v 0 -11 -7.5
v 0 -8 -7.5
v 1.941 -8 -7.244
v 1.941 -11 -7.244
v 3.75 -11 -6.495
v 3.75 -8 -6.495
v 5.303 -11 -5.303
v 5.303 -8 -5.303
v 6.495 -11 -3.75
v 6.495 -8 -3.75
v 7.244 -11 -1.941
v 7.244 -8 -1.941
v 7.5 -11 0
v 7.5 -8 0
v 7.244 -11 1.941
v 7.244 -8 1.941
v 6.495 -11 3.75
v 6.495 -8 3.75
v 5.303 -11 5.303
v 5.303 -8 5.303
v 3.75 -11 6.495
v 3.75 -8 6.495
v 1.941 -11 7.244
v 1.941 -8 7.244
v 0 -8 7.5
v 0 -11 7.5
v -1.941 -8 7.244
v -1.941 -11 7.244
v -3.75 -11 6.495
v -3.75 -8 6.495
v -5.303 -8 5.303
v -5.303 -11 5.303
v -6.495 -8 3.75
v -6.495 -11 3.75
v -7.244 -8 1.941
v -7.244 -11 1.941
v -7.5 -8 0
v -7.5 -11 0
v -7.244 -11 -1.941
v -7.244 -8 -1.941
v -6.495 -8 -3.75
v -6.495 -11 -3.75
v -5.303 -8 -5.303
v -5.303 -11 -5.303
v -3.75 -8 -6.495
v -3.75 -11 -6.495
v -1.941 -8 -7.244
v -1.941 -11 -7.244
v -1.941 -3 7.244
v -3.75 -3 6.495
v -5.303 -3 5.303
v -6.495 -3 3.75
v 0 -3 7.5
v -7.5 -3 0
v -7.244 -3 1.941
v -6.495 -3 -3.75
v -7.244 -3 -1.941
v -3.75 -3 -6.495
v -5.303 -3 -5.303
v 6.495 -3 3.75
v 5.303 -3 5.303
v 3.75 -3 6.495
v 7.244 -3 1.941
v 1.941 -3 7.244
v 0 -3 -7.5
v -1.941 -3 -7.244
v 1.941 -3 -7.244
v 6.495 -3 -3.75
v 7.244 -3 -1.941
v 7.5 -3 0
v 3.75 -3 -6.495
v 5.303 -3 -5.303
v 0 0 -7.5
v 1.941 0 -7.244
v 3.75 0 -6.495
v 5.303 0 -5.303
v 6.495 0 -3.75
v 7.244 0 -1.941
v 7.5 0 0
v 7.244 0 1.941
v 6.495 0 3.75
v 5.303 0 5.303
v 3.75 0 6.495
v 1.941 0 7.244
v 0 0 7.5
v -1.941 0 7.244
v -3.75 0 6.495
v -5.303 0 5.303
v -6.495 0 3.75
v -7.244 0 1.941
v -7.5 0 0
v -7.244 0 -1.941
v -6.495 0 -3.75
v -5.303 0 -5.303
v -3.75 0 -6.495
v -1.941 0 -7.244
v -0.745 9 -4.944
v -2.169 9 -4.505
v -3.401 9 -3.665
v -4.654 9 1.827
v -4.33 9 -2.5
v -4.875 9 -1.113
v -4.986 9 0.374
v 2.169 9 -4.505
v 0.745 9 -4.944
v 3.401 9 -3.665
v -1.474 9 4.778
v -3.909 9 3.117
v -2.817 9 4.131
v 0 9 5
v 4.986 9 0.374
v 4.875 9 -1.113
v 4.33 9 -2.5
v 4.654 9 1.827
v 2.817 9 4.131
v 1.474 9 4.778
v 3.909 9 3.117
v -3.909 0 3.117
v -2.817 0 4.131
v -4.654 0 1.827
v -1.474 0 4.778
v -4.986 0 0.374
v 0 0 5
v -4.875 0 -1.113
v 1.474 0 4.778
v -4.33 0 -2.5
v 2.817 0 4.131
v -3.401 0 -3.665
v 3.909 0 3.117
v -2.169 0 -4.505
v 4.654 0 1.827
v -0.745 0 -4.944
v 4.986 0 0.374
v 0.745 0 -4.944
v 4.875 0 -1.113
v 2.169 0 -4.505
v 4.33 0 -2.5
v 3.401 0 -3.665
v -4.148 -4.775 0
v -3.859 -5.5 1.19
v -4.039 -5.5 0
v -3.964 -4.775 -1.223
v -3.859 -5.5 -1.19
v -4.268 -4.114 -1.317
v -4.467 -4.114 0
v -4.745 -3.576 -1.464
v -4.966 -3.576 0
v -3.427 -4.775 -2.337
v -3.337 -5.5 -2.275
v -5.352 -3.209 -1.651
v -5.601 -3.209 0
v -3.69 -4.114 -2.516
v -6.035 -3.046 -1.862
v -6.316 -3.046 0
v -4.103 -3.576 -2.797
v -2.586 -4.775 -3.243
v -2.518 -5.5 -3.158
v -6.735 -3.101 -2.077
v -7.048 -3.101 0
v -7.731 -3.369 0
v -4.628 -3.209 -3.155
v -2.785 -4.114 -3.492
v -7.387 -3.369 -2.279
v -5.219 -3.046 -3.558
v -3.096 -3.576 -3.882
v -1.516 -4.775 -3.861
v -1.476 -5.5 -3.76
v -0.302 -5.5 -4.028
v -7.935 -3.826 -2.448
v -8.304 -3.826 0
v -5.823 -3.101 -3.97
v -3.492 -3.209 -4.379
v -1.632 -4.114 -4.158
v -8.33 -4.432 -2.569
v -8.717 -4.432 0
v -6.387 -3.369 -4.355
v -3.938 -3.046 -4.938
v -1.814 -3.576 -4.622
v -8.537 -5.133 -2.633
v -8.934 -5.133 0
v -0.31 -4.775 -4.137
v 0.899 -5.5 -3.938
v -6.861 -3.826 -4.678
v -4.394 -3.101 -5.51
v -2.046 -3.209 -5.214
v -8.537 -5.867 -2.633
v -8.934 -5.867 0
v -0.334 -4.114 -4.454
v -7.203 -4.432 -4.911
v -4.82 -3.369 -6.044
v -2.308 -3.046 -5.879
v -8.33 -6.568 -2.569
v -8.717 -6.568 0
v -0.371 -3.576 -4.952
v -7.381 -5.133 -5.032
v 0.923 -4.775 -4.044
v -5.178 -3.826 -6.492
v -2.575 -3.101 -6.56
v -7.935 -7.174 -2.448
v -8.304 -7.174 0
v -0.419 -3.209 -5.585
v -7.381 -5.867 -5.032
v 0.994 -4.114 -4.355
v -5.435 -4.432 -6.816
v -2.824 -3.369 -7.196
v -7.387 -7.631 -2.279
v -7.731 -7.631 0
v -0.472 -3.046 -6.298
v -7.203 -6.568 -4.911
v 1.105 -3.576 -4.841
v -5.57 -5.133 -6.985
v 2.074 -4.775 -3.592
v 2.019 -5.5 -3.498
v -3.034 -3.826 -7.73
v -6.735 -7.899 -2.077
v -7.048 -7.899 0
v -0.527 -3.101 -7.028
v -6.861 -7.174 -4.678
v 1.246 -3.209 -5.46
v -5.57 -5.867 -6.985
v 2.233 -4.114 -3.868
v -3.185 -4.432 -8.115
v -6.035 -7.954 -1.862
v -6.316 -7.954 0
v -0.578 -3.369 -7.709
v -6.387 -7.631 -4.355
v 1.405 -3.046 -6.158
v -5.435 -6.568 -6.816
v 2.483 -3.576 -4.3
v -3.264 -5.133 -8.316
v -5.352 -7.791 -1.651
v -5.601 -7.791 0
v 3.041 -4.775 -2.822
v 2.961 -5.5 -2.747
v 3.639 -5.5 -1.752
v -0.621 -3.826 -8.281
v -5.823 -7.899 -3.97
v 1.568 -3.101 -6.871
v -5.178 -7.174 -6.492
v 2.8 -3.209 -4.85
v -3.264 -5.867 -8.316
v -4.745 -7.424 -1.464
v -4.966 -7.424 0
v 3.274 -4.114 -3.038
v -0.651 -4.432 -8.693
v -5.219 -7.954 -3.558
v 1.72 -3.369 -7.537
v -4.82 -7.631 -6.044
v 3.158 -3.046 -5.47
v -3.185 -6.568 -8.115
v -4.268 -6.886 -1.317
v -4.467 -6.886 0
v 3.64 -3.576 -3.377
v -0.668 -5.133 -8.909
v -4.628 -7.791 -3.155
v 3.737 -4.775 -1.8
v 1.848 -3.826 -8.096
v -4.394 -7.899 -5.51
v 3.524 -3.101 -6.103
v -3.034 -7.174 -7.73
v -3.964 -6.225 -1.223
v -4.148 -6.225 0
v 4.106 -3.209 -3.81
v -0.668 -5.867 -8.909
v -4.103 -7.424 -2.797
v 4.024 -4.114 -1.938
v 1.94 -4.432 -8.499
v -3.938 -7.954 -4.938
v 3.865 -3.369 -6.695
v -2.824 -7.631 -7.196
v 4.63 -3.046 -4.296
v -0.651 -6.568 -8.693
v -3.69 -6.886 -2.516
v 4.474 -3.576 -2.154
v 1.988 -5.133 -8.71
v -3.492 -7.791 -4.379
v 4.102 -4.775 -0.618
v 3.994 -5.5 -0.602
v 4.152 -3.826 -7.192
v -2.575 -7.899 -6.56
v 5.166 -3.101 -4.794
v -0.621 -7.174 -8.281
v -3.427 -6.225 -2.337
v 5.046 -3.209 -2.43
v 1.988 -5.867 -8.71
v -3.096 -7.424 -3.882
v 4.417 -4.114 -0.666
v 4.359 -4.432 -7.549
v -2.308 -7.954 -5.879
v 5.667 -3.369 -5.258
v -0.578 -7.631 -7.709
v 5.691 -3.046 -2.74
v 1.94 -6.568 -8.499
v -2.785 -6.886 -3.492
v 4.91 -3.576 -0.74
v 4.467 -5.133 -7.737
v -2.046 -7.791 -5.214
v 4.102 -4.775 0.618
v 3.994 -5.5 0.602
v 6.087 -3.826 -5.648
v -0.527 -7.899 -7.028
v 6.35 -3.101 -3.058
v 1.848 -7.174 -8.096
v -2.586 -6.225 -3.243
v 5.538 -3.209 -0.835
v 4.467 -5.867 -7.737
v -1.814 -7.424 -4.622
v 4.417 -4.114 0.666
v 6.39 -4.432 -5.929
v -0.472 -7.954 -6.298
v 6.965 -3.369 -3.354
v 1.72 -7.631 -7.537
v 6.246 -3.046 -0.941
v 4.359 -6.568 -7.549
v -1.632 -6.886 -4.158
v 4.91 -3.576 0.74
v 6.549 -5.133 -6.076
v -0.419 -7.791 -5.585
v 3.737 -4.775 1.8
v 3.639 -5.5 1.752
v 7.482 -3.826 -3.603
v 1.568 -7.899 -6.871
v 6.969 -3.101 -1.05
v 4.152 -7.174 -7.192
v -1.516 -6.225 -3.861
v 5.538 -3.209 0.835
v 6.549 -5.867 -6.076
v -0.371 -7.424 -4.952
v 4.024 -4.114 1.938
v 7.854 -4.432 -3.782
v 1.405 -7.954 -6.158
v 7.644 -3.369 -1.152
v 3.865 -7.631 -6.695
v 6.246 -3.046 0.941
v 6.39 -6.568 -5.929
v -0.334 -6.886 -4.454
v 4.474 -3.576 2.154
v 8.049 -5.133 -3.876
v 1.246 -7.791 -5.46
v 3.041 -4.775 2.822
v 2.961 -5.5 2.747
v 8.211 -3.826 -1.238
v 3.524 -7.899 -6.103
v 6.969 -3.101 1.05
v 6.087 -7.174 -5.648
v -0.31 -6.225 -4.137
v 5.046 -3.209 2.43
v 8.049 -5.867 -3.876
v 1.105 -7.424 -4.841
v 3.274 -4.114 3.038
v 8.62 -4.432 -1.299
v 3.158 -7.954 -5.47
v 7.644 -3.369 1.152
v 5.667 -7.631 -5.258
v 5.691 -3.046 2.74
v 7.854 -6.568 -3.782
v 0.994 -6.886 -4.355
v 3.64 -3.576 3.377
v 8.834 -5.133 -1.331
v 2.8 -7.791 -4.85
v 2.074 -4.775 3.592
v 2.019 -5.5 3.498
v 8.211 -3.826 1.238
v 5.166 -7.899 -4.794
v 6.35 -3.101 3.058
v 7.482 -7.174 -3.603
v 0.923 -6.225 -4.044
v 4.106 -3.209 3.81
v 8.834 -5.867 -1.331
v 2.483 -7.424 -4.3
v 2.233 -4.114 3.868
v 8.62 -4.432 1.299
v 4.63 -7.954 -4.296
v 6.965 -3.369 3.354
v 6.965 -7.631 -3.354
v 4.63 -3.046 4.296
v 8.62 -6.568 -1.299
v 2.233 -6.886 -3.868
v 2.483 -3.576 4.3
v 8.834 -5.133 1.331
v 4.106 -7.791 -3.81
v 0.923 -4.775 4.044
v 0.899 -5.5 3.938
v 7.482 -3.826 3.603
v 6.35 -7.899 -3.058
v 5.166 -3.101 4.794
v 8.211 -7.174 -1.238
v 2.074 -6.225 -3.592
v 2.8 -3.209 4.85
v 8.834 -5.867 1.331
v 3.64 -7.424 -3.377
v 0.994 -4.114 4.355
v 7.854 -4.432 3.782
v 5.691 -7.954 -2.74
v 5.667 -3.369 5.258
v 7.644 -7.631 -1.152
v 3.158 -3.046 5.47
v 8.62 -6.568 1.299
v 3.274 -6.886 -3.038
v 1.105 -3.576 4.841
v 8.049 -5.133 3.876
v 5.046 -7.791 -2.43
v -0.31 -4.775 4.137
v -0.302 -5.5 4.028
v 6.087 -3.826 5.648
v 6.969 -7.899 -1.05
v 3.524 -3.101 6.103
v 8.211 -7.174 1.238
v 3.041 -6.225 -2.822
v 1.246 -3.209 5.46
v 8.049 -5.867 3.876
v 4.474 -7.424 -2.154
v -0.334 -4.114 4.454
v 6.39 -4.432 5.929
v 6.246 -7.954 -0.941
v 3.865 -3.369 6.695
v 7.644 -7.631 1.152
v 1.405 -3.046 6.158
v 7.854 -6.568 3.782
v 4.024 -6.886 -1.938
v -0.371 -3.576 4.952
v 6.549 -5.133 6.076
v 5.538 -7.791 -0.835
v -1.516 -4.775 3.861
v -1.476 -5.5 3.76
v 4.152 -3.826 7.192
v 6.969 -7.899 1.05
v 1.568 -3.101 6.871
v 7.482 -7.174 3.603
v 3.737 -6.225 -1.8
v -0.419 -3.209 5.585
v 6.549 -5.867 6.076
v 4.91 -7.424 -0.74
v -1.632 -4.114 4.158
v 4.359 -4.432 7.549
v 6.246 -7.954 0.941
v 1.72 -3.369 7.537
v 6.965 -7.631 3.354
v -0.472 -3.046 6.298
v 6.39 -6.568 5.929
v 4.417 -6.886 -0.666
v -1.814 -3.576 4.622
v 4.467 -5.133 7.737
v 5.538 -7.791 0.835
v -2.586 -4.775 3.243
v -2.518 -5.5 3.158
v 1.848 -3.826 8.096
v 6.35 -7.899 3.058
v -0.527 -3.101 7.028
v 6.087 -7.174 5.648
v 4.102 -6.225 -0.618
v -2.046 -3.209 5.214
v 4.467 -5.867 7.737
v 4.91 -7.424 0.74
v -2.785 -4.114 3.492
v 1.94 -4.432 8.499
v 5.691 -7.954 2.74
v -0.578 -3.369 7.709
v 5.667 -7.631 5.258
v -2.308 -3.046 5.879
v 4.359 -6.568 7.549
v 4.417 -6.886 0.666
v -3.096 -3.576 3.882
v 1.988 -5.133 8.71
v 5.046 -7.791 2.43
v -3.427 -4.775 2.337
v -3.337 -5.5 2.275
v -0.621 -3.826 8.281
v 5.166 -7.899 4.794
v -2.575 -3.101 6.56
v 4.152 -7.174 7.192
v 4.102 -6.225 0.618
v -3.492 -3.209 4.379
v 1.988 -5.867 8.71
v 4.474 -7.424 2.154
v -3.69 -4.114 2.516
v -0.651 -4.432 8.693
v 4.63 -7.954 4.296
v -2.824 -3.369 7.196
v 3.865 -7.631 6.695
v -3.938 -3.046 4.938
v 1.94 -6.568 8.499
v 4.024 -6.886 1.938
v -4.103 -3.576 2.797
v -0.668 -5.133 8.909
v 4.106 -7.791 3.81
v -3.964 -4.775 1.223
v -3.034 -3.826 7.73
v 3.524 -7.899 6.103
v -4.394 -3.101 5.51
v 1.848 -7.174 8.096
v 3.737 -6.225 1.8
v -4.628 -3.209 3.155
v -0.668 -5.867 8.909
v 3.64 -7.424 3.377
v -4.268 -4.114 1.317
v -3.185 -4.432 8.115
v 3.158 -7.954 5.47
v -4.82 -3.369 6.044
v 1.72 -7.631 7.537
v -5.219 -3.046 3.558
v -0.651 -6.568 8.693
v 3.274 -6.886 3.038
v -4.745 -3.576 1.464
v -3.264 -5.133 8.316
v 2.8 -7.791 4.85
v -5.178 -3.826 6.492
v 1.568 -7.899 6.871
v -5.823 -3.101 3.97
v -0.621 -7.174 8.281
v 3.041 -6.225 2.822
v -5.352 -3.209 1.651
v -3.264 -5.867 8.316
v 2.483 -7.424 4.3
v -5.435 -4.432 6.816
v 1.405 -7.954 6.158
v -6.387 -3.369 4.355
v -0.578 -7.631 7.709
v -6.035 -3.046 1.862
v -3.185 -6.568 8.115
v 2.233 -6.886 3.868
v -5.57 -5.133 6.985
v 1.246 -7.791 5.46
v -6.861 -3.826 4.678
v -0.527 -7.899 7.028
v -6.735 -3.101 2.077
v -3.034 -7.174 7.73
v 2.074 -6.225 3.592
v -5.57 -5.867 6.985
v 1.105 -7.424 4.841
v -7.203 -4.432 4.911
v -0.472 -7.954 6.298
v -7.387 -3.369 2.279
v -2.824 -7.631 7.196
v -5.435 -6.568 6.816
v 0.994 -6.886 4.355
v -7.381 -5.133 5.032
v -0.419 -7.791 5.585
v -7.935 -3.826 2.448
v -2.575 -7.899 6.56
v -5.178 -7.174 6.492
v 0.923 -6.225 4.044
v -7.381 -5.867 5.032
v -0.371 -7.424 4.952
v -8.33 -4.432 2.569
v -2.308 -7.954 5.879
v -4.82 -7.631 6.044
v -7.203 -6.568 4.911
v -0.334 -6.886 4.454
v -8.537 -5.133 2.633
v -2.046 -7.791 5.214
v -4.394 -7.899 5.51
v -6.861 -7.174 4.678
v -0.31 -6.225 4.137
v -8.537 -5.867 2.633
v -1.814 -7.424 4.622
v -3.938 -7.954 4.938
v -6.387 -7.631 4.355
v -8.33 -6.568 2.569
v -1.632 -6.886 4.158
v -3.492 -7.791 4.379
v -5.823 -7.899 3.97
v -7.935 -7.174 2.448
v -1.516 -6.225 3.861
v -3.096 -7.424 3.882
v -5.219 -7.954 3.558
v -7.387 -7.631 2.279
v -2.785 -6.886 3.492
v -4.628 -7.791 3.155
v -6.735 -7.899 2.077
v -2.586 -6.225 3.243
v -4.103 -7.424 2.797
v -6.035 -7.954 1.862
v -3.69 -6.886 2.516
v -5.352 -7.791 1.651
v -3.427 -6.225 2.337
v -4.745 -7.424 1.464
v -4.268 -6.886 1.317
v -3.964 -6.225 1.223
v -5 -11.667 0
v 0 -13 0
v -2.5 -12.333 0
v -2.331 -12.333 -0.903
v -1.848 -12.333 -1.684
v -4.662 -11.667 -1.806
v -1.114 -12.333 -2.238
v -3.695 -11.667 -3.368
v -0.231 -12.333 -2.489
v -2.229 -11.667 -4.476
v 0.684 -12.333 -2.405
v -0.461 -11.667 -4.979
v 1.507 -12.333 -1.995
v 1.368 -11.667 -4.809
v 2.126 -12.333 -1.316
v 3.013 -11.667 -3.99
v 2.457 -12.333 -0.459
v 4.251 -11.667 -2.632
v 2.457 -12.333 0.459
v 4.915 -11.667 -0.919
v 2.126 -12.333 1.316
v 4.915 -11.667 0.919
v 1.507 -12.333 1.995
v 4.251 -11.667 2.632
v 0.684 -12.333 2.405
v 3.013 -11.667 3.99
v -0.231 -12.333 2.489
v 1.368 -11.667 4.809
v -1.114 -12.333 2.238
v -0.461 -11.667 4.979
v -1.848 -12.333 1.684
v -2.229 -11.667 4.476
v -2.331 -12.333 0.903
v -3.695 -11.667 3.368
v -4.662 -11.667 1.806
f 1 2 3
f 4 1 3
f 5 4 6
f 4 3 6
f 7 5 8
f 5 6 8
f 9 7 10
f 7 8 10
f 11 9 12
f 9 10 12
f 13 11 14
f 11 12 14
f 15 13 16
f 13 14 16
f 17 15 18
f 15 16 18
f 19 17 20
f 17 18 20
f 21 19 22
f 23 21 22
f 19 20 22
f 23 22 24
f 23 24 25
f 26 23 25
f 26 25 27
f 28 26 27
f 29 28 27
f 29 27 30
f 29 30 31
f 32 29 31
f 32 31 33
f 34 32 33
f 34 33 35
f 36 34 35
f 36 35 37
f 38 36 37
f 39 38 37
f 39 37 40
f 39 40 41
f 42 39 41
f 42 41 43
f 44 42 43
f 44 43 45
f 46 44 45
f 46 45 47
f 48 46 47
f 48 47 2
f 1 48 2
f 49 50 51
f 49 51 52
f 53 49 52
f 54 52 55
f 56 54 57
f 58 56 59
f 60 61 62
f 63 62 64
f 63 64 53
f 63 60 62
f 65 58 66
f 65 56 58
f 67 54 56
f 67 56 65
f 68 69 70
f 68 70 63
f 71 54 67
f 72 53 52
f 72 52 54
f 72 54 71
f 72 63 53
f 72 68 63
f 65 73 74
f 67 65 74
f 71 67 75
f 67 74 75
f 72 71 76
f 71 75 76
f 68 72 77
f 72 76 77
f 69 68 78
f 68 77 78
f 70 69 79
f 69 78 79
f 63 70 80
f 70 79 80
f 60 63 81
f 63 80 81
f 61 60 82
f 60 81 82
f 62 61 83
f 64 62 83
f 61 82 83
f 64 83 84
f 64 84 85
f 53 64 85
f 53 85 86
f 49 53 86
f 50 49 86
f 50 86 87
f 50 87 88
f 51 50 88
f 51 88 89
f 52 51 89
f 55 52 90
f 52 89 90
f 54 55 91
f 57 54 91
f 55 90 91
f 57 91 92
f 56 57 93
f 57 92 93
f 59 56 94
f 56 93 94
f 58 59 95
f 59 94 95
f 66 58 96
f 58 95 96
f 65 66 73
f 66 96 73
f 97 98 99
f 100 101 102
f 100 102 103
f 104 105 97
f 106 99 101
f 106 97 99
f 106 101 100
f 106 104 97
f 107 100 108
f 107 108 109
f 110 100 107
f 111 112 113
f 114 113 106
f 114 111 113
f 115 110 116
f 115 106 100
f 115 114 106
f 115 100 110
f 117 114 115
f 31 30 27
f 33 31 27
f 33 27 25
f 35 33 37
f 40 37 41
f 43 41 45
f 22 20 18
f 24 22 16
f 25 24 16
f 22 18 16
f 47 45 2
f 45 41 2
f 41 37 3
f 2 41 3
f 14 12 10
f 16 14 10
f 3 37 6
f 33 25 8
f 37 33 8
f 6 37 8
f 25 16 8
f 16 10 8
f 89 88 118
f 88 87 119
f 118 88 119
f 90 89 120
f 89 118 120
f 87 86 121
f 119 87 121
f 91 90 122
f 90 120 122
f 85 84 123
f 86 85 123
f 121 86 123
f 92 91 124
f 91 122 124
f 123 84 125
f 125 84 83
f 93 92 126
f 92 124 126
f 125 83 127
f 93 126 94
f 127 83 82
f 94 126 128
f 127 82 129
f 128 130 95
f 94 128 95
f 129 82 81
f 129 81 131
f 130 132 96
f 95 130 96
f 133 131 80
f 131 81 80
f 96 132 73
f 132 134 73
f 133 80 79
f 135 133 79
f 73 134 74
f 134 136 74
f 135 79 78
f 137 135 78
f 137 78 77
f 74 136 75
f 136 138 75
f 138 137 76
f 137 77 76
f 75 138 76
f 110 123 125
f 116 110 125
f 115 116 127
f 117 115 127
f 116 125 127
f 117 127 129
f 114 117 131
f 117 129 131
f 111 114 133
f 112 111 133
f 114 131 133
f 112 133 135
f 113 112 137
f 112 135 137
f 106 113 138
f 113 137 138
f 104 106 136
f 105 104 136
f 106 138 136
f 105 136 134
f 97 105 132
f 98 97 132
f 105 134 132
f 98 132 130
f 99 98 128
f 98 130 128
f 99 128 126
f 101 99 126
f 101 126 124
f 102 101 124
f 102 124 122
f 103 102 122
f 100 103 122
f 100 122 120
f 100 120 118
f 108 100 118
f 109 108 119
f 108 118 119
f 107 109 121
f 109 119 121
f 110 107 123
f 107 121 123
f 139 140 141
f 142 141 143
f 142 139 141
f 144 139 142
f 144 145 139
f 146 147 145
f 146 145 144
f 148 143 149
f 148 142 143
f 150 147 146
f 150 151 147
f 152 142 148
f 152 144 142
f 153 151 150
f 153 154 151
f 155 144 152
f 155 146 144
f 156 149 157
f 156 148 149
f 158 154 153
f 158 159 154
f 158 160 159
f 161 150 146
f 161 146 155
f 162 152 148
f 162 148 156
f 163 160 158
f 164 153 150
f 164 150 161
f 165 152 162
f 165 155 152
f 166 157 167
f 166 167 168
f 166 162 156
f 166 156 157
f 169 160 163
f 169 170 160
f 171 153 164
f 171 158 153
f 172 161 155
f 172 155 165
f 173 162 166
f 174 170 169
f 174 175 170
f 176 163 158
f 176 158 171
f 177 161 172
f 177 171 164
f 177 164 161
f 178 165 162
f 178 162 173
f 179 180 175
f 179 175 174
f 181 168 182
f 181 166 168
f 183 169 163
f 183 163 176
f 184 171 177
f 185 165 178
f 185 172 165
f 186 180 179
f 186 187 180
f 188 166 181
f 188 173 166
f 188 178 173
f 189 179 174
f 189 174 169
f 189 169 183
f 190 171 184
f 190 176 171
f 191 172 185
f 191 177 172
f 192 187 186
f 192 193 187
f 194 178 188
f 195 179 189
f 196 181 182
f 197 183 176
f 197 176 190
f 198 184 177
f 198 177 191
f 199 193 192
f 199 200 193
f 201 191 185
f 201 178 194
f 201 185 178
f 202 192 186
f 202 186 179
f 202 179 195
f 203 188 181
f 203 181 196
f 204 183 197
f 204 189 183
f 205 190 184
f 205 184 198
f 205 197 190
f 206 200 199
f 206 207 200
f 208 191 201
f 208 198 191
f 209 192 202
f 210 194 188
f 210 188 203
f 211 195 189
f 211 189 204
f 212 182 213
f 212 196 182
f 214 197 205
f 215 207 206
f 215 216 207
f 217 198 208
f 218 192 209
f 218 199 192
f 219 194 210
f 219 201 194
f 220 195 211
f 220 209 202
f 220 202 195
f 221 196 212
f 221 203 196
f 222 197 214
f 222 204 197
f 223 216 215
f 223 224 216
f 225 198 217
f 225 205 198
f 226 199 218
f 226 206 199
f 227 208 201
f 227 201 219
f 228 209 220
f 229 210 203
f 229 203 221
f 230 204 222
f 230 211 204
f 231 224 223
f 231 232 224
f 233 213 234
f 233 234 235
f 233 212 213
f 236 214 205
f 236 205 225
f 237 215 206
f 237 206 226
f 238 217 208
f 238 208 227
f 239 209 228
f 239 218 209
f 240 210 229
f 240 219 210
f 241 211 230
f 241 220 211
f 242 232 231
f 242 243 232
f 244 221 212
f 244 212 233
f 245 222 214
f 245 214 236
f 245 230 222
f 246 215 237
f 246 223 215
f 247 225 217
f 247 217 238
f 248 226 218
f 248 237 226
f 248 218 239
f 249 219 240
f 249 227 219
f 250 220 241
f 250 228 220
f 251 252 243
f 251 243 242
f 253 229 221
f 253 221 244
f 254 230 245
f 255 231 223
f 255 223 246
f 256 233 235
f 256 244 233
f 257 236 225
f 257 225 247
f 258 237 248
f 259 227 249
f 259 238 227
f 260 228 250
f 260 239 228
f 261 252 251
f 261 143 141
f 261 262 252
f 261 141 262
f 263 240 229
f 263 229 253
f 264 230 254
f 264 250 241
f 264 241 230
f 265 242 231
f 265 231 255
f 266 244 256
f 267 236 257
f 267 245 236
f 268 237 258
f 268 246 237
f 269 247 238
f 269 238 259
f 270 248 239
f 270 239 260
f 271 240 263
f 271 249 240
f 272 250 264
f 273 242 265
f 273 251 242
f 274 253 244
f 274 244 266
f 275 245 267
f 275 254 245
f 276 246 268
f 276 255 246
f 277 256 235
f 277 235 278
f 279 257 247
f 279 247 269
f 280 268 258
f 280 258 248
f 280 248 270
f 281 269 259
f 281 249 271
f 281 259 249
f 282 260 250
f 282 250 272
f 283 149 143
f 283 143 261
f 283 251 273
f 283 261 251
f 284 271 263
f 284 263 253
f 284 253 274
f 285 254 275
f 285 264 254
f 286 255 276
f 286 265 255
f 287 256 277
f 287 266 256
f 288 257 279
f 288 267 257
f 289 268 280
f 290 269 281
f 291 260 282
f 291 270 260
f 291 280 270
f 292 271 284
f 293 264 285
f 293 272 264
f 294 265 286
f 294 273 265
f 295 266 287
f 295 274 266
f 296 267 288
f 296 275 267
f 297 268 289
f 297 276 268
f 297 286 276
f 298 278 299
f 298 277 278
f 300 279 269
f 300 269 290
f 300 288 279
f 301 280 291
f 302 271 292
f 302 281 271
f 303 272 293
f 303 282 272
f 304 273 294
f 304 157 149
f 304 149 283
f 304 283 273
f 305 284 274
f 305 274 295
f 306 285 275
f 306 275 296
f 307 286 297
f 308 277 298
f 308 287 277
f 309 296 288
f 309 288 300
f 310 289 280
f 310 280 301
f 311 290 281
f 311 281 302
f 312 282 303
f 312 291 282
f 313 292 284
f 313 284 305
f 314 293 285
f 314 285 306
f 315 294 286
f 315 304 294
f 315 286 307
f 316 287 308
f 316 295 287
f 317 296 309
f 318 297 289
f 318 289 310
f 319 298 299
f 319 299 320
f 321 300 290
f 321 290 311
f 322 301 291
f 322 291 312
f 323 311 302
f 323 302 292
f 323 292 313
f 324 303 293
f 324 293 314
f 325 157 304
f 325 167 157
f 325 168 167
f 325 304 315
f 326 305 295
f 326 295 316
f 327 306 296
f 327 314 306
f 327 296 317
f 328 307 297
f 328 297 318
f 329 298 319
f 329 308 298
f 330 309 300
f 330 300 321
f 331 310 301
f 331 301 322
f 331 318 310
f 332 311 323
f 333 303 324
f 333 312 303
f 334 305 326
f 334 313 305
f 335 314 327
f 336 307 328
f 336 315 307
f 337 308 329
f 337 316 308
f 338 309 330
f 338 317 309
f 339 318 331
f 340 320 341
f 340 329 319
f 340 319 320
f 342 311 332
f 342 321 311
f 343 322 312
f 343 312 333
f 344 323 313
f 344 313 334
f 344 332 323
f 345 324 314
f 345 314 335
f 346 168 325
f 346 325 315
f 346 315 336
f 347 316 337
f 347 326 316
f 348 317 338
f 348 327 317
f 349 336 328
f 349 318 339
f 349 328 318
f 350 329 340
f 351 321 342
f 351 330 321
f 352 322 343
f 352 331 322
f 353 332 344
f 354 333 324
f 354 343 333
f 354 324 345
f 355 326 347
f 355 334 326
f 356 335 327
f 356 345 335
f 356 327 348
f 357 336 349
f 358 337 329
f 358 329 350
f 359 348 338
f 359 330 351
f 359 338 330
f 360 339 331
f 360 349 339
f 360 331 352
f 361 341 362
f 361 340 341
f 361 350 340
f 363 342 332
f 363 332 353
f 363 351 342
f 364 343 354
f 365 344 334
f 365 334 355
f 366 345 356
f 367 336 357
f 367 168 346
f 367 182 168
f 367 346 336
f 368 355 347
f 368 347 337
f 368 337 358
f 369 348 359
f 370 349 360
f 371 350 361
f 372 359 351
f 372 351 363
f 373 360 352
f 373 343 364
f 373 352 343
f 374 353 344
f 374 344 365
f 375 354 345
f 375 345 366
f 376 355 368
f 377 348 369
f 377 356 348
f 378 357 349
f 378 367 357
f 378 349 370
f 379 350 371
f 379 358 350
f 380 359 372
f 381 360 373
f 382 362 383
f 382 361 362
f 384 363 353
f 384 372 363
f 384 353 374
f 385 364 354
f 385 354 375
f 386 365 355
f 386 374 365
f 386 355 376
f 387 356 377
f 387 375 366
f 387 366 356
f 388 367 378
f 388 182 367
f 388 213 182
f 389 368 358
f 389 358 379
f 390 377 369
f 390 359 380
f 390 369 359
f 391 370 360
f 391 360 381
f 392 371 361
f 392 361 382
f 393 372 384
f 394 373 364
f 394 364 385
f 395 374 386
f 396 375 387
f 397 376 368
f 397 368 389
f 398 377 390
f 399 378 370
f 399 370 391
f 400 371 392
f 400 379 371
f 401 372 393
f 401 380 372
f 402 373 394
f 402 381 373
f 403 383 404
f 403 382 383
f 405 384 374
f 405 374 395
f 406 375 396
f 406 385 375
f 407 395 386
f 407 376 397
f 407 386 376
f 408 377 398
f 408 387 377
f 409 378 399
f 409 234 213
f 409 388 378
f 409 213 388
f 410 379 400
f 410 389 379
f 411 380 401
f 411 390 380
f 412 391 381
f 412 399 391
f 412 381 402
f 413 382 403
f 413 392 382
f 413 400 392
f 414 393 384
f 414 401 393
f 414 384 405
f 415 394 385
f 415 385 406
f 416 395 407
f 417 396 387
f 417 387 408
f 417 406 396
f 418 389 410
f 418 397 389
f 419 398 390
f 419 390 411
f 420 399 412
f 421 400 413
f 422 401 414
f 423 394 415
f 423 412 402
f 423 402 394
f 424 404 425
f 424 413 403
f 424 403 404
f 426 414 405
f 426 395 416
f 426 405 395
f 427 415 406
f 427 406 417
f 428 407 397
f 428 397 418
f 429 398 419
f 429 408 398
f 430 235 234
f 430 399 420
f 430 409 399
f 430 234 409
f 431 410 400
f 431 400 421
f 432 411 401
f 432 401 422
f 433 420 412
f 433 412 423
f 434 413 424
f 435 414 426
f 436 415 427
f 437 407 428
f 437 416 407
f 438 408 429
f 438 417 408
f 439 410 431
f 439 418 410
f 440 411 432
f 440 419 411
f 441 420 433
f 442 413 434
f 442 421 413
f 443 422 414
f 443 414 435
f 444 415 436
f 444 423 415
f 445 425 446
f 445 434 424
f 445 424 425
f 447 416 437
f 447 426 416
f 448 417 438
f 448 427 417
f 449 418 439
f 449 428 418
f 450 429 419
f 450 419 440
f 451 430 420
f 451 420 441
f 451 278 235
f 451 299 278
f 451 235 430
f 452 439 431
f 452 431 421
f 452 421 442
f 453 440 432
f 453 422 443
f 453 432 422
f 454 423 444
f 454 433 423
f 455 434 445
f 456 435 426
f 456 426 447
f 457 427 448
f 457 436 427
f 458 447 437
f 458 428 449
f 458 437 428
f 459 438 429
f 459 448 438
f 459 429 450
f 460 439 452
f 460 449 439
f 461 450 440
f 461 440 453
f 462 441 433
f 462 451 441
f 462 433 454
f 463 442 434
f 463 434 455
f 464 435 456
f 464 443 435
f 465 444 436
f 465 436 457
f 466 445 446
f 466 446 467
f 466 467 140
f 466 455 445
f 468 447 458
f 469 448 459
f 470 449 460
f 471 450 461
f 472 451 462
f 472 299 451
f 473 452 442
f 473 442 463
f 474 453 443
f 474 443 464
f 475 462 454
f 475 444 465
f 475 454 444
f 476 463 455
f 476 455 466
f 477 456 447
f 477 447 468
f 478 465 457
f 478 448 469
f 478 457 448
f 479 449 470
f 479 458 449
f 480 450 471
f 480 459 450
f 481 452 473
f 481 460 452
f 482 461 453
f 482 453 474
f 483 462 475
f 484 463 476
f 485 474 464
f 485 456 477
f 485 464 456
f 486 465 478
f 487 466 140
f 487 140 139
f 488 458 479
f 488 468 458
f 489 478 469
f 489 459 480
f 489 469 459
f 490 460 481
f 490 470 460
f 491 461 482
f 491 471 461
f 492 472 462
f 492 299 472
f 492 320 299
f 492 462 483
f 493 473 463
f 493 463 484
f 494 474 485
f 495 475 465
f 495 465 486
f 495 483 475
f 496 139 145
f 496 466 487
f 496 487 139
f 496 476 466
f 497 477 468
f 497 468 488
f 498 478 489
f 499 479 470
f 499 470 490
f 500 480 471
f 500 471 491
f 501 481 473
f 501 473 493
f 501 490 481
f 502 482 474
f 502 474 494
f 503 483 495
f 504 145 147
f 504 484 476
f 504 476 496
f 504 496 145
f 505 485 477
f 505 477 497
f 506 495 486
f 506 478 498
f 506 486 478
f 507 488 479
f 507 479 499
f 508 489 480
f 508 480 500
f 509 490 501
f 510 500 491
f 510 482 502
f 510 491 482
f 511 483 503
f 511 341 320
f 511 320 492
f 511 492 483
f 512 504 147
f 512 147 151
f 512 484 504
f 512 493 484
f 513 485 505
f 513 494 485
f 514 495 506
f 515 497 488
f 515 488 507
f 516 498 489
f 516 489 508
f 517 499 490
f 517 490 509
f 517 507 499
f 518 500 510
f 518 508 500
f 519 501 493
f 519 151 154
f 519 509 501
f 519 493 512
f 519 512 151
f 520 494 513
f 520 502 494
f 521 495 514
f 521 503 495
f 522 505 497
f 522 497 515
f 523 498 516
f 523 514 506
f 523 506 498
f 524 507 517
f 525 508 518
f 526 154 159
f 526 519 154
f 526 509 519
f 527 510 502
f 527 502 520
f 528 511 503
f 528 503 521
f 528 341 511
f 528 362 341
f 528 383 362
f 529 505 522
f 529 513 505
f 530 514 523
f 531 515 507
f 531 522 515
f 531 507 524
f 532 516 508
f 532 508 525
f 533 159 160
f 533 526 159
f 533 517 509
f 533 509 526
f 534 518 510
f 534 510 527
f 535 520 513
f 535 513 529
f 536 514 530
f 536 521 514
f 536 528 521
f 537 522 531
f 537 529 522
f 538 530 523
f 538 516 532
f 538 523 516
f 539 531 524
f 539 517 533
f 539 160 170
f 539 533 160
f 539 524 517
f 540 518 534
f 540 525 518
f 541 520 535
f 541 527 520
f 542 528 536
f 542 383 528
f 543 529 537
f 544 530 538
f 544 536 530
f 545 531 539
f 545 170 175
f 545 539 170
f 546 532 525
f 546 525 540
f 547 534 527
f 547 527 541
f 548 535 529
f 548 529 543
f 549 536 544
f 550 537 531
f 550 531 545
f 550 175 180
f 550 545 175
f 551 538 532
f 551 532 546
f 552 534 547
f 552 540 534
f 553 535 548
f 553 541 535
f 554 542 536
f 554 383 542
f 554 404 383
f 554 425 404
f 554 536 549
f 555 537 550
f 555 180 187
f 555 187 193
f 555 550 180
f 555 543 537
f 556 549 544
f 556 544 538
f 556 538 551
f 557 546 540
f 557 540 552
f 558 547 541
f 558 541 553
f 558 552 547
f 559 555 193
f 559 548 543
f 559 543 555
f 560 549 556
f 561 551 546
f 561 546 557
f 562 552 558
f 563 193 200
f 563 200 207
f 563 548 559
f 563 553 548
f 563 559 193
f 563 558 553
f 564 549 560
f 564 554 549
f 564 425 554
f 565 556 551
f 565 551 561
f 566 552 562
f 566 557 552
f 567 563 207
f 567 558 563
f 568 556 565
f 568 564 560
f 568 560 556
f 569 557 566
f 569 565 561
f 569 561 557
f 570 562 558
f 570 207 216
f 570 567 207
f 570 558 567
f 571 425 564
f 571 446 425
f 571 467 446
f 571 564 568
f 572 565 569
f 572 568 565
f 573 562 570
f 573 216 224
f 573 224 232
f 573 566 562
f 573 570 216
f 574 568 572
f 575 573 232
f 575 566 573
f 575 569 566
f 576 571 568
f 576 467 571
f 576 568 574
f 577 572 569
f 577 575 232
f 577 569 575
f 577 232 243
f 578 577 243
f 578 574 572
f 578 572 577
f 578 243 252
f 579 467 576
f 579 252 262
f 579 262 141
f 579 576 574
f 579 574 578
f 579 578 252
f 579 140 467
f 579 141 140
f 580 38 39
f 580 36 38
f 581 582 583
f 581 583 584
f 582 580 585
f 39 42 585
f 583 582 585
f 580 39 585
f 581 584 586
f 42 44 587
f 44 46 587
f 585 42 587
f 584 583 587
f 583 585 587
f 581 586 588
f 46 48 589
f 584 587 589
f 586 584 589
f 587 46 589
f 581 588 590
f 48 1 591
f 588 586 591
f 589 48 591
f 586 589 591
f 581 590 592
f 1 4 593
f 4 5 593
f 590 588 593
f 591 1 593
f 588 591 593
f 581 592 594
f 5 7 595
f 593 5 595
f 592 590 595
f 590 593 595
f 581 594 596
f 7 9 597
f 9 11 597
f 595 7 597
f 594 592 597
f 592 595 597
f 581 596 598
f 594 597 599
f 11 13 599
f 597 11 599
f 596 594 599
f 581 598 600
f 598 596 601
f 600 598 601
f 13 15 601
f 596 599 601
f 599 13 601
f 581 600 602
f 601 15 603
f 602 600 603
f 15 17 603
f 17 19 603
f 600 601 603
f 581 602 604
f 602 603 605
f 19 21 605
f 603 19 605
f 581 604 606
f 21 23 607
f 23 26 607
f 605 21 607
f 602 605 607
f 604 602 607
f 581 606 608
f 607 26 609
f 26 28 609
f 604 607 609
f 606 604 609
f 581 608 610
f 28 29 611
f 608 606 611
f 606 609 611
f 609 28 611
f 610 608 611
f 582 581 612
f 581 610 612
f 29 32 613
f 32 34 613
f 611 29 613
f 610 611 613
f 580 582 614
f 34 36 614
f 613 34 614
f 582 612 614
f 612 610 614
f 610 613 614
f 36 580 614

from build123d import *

# Parameters (mm, degrees)
SKETCH1_R           = 5
BOSS_EXTRUDE1_DEPTH = 9
SKETCH2_R           = 7.5
BOSS_EXTRUDE2_DEPTH = 3
SKETCH5_R           = 2.461110706
SKETCH12_R          = 7.5
BOSS_EXTRUDE3_DEPTH = 3


with BuildPart() as part:
    # Sketch1 → Boss-Extrude1 (new body)
    with BuildSketch(Plane(origin=(0, 0, 0), x_dir=(1, 0, 0), z_dir=(0, 1, 0))):
        with Locations(Location((0, 0, 0), (0, 0, 270))):
            Circle(SKETCH1_R)
    extrude(amount=BOSS_EXTRUDE1_DEPTH)

    # Sketch2 → Boss-Extrude2 (add)
    with BuildSketch(Plane(origin=(0, 0, 0), x_dir=(-1, 0, 0), z_dir=(0, -1, 0))):
        with Locations(Location((0, 0, 0), (0, 0, 90))):
            Circle(SKETCH2_R)
    extrude(amount=BOSS_EXTRUDE2_DEPTH)


with BuildPart() as body_2:
    # Sweep1: sweep along a path in Sketch3
    with BuildLine(Plane(origin=(0, -5.5, 0), x_dir=(-1, 0, 0), z_dir=(0, -1, 0))) as sweep1_path:
        CenterArc((0, 0), 6.5, 0, 360)
    # Sketch5 → Sweep1 (sweep)
    with BuildSketch(Plane(origin=(0, 0, 0), x_dir=(0, 0, -1), z_dir=(1, 0, 0))):
        with Locations((-6.5, -5.5)):
            Circle(SKETCH5_R)
    sweep(path=sweep1_path.line)


with BuildPart() as body_3:
    # Sketch12 → Boss-Extrude3 (new body)
    with BuildSketch(Plane(origin=(0, -8, 0), x_dir=(-1, 0, 0), z_dir=(0, -1, 0))):
        with Locations(Location((0, 0, 0), (0, 0, 90))):
            Circle(SKETCH12_R)
    extrude(amount=BOSS_EXTRUDE3_DEPTH)

    # Sketch13 → Revolve1 (revolve)
    with BuildSketch(Plane.XY, mode=Mode.PRIVATE) as revolve1_sk:
        Polygon((0, -11), (0, -13), (7.5, -11), align=None)
    revolve(revolve1_sk.sketch.rotate(Axis((0, -11, 0), (0, -1, 0)), 180), axis=Axis((0, -11, 0), (0, -1, 0)))


solid = Compound([part.part, body_2.part, body_3.part])
